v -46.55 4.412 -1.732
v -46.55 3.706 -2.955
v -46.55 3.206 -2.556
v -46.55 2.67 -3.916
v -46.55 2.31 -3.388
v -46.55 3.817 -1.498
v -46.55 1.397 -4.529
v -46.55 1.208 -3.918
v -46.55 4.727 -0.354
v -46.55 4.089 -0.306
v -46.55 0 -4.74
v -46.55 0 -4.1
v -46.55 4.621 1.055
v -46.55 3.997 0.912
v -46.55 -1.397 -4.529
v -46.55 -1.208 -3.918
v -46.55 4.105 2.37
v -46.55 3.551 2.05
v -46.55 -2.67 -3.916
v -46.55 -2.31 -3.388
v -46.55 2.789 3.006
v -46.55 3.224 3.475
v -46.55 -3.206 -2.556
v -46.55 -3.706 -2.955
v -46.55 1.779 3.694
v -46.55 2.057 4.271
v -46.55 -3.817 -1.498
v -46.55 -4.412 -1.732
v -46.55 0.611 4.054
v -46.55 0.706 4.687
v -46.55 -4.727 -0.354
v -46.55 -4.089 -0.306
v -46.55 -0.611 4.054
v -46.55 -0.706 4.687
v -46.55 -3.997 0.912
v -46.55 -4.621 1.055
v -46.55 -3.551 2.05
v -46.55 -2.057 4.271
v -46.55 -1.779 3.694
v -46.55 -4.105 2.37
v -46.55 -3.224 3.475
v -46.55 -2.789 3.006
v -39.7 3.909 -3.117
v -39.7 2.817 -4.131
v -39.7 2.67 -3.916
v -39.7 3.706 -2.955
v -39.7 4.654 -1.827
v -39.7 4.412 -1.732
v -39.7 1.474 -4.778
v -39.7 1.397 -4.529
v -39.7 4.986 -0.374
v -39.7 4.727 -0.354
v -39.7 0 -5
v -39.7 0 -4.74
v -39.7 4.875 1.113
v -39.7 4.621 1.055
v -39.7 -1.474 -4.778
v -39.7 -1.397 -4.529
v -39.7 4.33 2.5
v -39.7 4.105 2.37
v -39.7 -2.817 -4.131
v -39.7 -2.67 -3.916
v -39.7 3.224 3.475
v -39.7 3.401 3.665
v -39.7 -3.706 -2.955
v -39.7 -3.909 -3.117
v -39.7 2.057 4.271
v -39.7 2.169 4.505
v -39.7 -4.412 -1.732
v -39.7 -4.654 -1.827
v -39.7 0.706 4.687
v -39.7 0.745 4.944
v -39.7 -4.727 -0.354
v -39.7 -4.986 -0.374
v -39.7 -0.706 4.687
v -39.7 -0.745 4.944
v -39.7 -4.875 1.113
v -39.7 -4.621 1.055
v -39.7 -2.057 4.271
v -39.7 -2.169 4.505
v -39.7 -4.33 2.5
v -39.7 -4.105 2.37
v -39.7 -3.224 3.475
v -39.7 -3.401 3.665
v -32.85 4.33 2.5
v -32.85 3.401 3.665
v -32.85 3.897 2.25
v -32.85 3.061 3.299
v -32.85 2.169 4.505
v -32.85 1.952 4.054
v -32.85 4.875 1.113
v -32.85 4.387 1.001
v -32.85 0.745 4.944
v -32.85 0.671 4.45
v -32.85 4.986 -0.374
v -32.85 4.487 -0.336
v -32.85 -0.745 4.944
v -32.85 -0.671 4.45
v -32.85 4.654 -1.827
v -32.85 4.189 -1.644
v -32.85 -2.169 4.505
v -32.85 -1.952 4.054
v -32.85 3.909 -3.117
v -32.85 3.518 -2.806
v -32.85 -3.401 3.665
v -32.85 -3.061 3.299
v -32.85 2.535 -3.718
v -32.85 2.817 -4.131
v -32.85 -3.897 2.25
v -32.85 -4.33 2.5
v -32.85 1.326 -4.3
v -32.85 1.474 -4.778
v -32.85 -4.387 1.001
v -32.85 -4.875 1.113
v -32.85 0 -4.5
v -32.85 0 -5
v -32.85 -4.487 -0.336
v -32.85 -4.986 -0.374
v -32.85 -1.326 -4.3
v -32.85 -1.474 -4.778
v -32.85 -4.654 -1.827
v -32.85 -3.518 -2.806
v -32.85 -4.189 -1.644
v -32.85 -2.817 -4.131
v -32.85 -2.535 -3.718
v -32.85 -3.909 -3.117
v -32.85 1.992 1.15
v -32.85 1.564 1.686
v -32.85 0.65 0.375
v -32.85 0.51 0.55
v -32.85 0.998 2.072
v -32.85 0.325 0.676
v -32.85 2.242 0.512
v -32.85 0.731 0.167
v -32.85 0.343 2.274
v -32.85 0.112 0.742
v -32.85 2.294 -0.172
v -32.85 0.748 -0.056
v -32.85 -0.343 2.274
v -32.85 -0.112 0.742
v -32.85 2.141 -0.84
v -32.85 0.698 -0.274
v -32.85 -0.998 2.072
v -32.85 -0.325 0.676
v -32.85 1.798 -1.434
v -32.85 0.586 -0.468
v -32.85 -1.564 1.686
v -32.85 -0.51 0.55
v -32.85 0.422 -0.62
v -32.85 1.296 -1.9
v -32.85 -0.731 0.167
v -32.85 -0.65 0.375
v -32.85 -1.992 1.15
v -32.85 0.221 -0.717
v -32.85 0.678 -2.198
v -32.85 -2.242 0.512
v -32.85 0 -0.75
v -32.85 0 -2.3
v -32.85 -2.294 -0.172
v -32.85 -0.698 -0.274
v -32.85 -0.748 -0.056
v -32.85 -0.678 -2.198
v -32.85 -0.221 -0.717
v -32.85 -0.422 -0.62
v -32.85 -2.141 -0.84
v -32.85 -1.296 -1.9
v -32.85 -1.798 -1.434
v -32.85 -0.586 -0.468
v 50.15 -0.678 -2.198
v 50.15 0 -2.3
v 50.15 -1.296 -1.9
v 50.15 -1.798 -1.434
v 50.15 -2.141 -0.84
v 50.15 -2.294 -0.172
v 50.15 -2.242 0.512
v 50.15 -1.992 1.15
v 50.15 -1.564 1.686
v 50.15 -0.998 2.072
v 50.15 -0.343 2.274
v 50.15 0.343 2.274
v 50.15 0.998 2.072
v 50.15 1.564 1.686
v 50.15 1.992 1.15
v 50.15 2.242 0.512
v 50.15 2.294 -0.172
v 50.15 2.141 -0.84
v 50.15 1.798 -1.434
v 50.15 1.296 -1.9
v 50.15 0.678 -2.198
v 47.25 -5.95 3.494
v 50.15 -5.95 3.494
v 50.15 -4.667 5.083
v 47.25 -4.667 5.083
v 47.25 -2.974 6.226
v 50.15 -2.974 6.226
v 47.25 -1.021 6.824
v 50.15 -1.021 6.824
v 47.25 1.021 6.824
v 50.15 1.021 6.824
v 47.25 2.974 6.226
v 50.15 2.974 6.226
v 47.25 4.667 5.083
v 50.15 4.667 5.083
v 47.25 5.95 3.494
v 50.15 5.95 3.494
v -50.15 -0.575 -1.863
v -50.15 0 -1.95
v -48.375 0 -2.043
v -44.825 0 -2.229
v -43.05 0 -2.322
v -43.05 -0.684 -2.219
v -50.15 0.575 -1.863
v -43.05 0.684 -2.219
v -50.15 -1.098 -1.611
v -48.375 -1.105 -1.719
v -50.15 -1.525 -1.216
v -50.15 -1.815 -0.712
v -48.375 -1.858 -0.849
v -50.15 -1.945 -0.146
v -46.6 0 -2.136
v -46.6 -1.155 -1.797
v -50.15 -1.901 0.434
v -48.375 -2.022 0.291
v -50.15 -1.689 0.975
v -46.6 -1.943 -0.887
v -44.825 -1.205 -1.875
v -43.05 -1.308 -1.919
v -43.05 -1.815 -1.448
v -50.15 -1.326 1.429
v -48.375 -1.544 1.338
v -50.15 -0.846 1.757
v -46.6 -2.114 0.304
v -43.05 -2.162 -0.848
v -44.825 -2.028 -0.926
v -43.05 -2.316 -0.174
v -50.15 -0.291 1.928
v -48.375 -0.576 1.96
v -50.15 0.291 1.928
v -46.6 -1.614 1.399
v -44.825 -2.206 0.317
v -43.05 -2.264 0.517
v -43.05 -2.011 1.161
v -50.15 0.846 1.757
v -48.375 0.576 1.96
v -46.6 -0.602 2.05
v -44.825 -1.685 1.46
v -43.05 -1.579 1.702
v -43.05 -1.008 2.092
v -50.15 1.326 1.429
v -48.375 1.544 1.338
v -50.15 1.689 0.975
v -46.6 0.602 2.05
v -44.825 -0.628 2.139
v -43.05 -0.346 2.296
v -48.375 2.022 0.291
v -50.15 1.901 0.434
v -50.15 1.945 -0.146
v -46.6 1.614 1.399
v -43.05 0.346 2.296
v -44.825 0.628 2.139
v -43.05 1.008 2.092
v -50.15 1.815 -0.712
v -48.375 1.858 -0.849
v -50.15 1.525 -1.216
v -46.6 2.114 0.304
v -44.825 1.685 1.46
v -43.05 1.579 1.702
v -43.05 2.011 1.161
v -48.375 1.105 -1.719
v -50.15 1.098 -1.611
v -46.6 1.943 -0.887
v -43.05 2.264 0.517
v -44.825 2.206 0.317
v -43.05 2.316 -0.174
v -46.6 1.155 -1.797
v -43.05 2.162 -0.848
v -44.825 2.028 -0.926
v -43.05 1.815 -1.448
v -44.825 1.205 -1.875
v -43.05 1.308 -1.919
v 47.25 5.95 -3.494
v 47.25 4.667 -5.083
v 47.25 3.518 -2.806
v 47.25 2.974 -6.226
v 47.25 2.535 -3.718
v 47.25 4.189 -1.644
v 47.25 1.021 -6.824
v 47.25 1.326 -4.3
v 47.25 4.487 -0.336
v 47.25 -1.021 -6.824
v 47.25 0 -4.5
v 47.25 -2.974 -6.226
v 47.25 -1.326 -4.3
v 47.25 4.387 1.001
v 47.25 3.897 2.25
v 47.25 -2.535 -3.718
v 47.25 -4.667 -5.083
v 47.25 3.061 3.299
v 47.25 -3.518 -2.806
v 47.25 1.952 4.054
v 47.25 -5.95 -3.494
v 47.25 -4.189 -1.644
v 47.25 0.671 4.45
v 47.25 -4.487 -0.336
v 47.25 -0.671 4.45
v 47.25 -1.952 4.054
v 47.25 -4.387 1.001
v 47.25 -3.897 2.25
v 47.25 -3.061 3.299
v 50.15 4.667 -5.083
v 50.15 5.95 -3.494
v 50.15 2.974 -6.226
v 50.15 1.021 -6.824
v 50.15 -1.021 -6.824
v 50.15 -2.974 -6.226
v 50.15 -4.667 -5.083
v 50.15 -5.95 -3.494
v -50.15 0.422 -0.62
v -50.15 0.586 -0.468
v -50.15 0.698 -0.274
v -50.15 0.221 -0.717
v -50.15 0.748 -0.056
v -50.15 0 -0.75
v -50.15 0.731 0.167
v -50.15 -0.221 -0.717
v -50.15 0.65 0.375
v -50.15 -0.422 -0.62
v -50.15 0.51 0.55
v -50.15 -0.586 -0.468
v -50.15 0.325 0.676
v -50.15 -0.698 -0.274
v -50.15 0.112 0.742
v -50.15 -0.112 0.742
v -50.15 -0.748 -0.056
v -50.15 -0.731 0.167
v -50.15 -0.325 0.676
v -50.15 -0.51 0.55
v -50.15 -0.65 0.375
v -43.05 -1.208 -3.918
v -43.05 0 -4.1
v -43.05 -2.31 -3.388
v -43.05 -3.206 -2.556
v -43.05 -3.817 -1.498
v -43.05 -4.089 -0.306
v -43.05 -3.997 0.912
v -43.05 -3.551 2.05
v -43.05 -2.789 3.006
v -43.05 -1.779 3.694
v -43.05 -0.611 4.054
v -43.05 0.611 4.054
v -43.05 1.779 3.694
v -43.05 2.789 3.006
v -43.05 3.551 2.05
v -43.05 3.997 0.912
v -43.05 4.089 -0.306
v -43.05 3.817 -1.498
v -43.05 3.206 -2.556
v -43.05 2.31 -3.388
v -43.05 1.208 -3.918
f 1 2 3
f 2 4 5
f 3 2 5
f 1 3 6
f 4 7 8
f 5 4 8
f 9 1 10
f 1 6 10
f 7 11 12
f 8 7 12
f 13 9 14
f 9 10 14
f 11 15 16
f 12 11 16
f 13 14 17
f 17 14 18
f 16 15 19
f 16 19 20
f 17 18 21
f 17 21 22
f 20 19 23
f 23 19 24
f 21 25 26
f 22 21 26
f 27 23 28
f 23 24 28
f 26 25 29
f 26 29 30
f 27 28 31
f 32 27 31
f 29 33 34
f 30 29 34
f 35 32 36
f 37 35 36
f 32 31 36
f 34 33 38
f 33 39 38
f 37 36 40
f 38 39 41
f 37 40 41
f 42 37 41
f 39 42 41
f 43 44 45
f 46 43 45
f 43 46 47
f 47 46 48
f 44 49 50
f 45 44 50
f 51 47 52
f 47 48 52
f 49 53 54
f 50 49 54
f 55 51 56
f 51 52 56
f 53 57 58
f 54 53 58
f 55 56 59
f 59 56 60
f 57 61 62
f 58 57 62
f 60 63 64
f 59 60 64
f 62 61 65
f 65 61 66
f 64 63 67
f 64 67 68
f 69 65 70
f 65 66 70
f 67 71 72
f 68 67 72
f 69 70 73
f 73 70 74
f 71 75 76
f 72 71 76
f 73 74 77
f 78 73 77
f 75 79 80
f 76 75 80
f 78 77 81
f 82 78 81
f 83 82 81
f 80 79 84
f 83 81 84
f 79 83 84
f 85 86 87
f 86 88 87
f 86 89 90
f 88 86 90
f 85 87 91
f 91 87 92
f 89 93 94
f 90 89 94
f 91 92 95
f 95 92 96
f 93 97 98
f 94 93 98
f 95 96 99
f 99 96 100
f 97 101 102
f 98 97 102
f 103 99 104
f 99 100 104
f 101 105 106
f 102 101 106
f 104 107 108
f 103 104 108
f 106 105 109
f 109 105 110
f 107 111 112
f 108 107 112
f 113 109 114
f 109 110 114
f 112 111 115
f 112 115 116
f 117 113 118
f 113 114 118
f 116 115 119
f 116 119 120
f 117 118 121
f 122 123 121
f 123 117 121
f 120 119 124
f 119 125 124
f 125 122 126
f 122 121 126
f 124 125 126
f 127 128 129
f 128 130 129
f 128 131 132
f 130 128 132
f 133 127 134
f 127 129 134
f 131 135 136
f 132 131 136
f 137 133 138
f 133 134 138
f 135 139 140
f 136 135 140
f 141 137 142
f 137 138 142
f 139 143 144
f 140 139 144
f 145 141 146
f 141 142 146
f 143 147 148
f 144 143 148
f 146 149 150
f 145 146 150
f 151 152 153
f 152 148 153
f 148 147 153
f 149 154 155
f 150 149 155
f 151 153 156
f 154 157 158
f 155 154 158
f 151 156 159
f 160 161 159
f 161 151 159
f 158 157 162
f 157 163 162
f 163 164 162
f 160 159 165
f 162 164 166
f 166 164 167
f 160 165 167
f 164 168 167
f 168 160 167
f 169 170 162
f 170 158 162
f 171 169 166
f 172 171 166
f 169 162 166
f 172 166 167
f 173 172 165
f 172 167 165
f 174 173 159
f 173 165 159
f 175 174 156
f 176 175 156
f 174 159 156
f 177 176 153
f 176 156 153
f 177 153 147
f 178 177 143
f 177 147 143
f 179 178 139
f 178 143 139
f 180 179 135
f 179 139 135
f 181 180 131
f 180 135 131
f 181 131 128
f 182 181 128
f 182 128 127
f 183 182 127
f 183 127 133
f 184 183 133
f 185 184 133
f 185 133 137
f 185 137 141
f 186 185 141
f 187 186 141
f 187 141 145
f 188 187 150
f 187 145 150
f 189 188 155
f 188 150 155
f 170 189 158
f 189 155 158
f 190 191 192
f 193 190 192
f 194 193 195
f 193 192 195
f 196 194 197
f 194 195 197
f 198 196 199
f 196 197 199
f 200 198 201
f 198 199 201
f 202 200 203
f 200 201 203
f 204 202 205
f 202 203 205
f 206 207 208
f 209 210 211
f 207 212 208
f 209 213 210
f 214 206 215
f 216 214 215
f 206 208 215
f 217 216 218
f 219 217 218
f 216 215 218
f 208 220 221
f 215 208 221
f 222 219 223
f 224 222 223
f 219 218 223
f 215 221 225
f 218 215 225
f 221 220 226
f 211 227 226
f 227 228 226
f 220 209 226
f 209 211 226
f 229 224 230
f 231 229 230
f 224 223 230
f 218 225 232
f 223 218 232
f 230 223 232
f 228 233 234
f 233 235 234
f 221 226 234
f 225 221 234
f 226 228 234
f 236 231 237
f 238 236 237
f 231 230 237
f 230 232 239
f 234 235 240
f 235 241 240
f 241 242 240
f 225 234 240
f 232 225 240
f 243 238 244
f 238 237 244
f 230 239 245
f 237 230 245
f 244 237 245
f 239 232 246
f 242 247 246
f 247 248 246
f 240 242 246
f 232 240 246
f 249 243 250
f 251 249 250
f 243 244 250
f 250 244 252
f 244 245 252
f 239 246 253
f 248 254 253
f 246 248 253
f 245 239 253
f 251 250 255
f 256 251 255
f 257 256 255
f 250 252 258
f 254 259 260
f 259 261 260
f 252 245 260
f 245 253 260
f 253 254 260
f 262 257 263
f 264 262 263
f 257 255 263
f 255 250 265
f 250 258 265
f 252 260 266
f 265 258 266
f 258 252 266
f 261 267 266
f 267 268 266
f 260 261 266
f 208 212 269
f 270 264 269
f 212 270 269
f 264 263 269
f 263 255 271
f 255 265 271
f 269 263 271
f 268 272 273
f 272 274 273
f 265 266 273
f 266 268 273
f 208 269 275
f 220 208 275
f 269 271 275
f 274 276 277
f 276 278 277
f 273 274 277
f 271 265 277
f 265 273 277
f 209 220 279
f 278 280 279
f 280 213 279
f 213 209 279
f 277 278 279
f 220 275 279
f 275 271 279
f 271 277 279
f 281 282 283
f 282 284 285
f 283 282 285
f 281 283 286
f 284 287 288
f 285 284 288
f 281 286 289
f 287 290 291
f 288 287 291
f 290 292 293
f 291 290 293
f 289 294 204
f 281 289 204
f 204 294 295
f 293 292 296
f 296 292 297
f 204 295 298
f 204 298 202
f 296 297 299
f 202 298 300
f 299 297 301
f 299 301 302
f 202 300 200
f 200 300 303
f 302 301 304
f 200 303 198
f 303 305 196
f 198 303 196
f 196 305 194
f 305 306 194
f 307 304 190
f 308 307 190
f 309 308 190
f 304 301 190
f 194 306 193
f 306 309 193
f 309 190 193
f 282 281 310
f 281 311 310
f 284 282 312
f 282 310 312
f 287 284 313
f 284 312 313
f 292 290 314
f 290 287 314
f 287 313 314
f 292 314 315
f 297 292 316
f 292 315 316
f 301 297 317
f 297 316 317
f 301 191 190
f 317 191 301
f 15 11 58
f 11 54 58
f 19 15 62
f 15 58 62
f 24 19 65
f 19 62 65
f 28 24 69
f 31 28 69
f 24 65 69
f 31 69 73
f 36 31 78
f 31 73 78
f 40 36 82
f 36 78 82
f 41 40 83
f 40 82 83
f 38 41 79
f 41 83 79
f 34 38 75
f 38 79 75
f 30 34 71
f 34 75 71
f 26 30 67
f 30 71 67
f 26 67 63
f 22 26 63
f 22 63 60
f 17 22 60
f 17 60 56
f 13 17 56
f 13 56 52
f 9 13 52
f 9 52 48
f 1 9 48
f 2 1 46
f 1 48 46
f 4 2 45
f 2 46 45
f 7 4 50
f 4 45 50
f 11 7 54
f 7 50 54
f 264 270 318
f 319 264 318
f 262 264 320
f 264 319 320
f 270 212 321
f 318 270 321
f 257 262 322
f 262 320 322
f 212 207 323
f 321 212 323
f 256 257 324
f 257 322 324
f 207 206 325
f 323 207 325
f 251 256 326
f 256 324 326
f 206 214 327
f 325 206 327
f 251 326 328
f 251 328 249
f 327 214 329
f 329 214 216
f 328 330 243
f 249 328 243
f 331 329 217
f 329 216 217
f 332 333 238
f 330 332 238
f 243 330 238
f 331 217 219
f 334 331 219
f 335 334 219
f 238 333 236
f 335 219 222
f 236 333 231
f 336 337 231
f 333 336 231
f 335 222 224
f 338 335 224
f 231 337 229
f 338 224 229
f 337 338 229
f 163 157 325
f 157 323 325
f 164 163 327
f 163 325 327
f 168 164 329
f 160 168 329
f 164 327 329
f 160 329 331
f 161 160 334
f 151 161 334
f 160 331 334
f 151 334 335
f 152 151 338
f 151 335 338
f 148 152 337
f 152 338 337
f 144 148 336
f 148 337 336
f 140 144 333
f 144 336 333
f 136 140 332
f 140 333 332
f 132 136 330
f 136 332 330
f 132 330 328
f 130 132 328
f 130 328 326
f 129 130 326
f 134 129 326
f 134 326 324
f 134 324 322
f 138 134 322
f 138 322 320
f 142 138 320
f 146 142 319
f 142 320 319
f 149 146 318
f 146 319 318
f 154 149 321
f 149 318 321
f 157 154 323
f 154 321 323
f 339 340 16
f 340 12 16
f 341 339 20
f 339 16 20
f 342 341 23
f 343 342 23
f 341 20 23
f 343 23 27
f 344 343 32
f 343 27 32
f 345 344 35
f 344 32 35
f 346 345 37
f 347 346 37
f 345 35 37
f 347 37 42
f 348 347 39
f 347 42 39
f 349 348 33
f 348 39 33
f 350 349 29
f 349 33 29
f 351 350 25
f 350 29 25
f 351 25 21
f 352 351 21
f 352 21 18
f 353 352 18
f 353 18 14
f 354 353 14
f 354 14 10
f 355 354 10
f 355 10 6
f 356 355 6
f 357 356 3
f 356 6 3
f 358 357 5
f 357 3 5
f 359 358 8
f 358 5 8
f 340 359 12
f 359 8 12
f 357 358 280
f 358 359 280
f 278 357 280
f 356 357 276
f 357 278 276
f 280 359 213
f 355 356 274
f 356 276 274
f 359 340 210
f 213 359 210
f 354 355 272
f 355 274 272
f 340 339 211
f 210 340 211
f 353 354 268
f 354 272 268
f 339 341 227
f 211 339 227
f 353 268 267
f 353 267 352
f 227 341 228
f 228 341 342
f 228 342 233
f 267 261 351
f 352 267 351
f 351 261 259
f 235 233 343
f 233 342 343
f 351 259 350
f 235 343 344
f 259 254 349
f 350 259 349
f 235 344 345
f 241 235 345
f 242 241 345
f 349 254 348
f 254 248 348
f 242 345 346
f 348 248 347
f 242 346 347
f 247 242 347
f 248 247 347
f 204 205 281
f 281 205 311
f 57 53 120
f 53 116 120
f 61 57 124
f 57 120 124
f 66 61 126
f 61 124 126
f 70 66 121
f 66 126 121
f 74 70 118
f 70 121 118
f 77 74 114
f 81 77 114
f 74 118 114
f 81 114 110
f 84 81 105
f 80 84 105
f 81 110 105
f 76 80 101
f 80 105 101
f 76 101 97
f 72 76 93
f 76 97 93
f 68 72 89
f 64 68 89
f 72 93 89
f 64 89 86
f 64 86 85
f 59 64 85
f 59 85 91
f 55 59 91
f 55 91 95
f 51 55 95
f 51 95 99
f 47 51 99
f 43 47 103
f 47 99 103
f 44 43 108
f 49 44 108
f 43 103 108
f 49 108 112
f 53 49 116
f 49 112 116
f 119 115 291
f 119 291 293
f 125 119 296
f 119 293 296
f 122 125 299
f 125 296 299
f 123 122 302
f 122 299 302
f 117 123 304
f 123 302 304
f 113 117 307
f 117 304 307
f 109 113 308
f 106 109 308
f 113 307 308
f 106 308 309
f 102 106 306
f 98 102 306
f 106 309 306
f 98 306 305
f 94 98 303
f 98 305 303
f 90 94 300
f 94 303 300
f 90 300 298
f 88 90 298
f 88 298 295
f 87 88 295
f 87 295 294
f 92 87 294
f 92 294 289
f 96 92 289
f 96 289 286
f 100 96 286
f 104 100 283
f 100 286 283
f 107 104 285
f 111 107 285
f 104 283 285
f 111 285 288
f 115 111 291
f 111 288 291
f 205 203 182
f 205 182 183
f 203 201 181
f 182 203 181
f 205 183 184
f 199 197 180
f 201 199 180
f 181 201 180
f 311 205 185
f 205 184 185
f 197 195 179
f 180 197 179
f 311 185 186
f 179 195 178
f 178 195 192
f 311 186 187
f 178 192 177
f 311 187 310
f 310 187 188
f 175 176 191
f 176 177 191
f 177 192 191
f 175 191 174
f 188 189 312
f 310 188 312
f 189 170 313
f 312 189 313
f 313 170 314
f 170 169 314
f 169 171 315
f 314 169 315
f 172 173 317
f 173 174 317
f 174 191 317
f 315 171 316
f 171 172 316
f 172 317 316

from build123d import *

# Parameters (mm, degrees)
SKETCH2_W          = 19
SKETCH2_H          = 15.9
SKETCH2_W_2        = 15
SKETCH2_H_2        = 11.9
CUT_EXTRUDE1_DEPTH = 2.9


with BuildPart() as part:
    # Sketch1 → Revolve1 (revolve)
    with BuildSketch(Plane(origin=(0, 0, 0), x_dir=(1, 0, 0), z_dir=(0, 1, 0))):
        Polygon((-50.15, 0.75), (-50.15, 1.95), (-43.05, 2.322095233), (-43.05, 4.1), (-46.55, 4.1), (-46.55, 4.74), (-39.7, 4.74), (-39.7, 5), (-32.85, 5), (-32.85, 4.5), (47.25, 4.5), (47.25, 6.9), (50.15, 6.9), (50.15, 2.3), (-32.85, 2.3), (-32.85, 0.75), align=None)
    revolve(axis=Axis((50.15, 0, 0), (-1, 0, 0)))

    # Sketch2 → Cut-Extrude1 (cut)
    with BuildSketch(Plane(origin=(50.15, 0, 0), x_dir=(0, 0, -1), z_dir=(1, 0, 0))):
        Rectangle(SKETCH2_W, SKETCH2_H)
        Rectangle(SKETCH2_W_2, SKETCH2_H_2, mode=Mode.SUBTRACT)
    extrude(amount=-CUT_EXTRUDE1_DEPTH, mode=Mode.SUBTRACT)


solid = part.part
